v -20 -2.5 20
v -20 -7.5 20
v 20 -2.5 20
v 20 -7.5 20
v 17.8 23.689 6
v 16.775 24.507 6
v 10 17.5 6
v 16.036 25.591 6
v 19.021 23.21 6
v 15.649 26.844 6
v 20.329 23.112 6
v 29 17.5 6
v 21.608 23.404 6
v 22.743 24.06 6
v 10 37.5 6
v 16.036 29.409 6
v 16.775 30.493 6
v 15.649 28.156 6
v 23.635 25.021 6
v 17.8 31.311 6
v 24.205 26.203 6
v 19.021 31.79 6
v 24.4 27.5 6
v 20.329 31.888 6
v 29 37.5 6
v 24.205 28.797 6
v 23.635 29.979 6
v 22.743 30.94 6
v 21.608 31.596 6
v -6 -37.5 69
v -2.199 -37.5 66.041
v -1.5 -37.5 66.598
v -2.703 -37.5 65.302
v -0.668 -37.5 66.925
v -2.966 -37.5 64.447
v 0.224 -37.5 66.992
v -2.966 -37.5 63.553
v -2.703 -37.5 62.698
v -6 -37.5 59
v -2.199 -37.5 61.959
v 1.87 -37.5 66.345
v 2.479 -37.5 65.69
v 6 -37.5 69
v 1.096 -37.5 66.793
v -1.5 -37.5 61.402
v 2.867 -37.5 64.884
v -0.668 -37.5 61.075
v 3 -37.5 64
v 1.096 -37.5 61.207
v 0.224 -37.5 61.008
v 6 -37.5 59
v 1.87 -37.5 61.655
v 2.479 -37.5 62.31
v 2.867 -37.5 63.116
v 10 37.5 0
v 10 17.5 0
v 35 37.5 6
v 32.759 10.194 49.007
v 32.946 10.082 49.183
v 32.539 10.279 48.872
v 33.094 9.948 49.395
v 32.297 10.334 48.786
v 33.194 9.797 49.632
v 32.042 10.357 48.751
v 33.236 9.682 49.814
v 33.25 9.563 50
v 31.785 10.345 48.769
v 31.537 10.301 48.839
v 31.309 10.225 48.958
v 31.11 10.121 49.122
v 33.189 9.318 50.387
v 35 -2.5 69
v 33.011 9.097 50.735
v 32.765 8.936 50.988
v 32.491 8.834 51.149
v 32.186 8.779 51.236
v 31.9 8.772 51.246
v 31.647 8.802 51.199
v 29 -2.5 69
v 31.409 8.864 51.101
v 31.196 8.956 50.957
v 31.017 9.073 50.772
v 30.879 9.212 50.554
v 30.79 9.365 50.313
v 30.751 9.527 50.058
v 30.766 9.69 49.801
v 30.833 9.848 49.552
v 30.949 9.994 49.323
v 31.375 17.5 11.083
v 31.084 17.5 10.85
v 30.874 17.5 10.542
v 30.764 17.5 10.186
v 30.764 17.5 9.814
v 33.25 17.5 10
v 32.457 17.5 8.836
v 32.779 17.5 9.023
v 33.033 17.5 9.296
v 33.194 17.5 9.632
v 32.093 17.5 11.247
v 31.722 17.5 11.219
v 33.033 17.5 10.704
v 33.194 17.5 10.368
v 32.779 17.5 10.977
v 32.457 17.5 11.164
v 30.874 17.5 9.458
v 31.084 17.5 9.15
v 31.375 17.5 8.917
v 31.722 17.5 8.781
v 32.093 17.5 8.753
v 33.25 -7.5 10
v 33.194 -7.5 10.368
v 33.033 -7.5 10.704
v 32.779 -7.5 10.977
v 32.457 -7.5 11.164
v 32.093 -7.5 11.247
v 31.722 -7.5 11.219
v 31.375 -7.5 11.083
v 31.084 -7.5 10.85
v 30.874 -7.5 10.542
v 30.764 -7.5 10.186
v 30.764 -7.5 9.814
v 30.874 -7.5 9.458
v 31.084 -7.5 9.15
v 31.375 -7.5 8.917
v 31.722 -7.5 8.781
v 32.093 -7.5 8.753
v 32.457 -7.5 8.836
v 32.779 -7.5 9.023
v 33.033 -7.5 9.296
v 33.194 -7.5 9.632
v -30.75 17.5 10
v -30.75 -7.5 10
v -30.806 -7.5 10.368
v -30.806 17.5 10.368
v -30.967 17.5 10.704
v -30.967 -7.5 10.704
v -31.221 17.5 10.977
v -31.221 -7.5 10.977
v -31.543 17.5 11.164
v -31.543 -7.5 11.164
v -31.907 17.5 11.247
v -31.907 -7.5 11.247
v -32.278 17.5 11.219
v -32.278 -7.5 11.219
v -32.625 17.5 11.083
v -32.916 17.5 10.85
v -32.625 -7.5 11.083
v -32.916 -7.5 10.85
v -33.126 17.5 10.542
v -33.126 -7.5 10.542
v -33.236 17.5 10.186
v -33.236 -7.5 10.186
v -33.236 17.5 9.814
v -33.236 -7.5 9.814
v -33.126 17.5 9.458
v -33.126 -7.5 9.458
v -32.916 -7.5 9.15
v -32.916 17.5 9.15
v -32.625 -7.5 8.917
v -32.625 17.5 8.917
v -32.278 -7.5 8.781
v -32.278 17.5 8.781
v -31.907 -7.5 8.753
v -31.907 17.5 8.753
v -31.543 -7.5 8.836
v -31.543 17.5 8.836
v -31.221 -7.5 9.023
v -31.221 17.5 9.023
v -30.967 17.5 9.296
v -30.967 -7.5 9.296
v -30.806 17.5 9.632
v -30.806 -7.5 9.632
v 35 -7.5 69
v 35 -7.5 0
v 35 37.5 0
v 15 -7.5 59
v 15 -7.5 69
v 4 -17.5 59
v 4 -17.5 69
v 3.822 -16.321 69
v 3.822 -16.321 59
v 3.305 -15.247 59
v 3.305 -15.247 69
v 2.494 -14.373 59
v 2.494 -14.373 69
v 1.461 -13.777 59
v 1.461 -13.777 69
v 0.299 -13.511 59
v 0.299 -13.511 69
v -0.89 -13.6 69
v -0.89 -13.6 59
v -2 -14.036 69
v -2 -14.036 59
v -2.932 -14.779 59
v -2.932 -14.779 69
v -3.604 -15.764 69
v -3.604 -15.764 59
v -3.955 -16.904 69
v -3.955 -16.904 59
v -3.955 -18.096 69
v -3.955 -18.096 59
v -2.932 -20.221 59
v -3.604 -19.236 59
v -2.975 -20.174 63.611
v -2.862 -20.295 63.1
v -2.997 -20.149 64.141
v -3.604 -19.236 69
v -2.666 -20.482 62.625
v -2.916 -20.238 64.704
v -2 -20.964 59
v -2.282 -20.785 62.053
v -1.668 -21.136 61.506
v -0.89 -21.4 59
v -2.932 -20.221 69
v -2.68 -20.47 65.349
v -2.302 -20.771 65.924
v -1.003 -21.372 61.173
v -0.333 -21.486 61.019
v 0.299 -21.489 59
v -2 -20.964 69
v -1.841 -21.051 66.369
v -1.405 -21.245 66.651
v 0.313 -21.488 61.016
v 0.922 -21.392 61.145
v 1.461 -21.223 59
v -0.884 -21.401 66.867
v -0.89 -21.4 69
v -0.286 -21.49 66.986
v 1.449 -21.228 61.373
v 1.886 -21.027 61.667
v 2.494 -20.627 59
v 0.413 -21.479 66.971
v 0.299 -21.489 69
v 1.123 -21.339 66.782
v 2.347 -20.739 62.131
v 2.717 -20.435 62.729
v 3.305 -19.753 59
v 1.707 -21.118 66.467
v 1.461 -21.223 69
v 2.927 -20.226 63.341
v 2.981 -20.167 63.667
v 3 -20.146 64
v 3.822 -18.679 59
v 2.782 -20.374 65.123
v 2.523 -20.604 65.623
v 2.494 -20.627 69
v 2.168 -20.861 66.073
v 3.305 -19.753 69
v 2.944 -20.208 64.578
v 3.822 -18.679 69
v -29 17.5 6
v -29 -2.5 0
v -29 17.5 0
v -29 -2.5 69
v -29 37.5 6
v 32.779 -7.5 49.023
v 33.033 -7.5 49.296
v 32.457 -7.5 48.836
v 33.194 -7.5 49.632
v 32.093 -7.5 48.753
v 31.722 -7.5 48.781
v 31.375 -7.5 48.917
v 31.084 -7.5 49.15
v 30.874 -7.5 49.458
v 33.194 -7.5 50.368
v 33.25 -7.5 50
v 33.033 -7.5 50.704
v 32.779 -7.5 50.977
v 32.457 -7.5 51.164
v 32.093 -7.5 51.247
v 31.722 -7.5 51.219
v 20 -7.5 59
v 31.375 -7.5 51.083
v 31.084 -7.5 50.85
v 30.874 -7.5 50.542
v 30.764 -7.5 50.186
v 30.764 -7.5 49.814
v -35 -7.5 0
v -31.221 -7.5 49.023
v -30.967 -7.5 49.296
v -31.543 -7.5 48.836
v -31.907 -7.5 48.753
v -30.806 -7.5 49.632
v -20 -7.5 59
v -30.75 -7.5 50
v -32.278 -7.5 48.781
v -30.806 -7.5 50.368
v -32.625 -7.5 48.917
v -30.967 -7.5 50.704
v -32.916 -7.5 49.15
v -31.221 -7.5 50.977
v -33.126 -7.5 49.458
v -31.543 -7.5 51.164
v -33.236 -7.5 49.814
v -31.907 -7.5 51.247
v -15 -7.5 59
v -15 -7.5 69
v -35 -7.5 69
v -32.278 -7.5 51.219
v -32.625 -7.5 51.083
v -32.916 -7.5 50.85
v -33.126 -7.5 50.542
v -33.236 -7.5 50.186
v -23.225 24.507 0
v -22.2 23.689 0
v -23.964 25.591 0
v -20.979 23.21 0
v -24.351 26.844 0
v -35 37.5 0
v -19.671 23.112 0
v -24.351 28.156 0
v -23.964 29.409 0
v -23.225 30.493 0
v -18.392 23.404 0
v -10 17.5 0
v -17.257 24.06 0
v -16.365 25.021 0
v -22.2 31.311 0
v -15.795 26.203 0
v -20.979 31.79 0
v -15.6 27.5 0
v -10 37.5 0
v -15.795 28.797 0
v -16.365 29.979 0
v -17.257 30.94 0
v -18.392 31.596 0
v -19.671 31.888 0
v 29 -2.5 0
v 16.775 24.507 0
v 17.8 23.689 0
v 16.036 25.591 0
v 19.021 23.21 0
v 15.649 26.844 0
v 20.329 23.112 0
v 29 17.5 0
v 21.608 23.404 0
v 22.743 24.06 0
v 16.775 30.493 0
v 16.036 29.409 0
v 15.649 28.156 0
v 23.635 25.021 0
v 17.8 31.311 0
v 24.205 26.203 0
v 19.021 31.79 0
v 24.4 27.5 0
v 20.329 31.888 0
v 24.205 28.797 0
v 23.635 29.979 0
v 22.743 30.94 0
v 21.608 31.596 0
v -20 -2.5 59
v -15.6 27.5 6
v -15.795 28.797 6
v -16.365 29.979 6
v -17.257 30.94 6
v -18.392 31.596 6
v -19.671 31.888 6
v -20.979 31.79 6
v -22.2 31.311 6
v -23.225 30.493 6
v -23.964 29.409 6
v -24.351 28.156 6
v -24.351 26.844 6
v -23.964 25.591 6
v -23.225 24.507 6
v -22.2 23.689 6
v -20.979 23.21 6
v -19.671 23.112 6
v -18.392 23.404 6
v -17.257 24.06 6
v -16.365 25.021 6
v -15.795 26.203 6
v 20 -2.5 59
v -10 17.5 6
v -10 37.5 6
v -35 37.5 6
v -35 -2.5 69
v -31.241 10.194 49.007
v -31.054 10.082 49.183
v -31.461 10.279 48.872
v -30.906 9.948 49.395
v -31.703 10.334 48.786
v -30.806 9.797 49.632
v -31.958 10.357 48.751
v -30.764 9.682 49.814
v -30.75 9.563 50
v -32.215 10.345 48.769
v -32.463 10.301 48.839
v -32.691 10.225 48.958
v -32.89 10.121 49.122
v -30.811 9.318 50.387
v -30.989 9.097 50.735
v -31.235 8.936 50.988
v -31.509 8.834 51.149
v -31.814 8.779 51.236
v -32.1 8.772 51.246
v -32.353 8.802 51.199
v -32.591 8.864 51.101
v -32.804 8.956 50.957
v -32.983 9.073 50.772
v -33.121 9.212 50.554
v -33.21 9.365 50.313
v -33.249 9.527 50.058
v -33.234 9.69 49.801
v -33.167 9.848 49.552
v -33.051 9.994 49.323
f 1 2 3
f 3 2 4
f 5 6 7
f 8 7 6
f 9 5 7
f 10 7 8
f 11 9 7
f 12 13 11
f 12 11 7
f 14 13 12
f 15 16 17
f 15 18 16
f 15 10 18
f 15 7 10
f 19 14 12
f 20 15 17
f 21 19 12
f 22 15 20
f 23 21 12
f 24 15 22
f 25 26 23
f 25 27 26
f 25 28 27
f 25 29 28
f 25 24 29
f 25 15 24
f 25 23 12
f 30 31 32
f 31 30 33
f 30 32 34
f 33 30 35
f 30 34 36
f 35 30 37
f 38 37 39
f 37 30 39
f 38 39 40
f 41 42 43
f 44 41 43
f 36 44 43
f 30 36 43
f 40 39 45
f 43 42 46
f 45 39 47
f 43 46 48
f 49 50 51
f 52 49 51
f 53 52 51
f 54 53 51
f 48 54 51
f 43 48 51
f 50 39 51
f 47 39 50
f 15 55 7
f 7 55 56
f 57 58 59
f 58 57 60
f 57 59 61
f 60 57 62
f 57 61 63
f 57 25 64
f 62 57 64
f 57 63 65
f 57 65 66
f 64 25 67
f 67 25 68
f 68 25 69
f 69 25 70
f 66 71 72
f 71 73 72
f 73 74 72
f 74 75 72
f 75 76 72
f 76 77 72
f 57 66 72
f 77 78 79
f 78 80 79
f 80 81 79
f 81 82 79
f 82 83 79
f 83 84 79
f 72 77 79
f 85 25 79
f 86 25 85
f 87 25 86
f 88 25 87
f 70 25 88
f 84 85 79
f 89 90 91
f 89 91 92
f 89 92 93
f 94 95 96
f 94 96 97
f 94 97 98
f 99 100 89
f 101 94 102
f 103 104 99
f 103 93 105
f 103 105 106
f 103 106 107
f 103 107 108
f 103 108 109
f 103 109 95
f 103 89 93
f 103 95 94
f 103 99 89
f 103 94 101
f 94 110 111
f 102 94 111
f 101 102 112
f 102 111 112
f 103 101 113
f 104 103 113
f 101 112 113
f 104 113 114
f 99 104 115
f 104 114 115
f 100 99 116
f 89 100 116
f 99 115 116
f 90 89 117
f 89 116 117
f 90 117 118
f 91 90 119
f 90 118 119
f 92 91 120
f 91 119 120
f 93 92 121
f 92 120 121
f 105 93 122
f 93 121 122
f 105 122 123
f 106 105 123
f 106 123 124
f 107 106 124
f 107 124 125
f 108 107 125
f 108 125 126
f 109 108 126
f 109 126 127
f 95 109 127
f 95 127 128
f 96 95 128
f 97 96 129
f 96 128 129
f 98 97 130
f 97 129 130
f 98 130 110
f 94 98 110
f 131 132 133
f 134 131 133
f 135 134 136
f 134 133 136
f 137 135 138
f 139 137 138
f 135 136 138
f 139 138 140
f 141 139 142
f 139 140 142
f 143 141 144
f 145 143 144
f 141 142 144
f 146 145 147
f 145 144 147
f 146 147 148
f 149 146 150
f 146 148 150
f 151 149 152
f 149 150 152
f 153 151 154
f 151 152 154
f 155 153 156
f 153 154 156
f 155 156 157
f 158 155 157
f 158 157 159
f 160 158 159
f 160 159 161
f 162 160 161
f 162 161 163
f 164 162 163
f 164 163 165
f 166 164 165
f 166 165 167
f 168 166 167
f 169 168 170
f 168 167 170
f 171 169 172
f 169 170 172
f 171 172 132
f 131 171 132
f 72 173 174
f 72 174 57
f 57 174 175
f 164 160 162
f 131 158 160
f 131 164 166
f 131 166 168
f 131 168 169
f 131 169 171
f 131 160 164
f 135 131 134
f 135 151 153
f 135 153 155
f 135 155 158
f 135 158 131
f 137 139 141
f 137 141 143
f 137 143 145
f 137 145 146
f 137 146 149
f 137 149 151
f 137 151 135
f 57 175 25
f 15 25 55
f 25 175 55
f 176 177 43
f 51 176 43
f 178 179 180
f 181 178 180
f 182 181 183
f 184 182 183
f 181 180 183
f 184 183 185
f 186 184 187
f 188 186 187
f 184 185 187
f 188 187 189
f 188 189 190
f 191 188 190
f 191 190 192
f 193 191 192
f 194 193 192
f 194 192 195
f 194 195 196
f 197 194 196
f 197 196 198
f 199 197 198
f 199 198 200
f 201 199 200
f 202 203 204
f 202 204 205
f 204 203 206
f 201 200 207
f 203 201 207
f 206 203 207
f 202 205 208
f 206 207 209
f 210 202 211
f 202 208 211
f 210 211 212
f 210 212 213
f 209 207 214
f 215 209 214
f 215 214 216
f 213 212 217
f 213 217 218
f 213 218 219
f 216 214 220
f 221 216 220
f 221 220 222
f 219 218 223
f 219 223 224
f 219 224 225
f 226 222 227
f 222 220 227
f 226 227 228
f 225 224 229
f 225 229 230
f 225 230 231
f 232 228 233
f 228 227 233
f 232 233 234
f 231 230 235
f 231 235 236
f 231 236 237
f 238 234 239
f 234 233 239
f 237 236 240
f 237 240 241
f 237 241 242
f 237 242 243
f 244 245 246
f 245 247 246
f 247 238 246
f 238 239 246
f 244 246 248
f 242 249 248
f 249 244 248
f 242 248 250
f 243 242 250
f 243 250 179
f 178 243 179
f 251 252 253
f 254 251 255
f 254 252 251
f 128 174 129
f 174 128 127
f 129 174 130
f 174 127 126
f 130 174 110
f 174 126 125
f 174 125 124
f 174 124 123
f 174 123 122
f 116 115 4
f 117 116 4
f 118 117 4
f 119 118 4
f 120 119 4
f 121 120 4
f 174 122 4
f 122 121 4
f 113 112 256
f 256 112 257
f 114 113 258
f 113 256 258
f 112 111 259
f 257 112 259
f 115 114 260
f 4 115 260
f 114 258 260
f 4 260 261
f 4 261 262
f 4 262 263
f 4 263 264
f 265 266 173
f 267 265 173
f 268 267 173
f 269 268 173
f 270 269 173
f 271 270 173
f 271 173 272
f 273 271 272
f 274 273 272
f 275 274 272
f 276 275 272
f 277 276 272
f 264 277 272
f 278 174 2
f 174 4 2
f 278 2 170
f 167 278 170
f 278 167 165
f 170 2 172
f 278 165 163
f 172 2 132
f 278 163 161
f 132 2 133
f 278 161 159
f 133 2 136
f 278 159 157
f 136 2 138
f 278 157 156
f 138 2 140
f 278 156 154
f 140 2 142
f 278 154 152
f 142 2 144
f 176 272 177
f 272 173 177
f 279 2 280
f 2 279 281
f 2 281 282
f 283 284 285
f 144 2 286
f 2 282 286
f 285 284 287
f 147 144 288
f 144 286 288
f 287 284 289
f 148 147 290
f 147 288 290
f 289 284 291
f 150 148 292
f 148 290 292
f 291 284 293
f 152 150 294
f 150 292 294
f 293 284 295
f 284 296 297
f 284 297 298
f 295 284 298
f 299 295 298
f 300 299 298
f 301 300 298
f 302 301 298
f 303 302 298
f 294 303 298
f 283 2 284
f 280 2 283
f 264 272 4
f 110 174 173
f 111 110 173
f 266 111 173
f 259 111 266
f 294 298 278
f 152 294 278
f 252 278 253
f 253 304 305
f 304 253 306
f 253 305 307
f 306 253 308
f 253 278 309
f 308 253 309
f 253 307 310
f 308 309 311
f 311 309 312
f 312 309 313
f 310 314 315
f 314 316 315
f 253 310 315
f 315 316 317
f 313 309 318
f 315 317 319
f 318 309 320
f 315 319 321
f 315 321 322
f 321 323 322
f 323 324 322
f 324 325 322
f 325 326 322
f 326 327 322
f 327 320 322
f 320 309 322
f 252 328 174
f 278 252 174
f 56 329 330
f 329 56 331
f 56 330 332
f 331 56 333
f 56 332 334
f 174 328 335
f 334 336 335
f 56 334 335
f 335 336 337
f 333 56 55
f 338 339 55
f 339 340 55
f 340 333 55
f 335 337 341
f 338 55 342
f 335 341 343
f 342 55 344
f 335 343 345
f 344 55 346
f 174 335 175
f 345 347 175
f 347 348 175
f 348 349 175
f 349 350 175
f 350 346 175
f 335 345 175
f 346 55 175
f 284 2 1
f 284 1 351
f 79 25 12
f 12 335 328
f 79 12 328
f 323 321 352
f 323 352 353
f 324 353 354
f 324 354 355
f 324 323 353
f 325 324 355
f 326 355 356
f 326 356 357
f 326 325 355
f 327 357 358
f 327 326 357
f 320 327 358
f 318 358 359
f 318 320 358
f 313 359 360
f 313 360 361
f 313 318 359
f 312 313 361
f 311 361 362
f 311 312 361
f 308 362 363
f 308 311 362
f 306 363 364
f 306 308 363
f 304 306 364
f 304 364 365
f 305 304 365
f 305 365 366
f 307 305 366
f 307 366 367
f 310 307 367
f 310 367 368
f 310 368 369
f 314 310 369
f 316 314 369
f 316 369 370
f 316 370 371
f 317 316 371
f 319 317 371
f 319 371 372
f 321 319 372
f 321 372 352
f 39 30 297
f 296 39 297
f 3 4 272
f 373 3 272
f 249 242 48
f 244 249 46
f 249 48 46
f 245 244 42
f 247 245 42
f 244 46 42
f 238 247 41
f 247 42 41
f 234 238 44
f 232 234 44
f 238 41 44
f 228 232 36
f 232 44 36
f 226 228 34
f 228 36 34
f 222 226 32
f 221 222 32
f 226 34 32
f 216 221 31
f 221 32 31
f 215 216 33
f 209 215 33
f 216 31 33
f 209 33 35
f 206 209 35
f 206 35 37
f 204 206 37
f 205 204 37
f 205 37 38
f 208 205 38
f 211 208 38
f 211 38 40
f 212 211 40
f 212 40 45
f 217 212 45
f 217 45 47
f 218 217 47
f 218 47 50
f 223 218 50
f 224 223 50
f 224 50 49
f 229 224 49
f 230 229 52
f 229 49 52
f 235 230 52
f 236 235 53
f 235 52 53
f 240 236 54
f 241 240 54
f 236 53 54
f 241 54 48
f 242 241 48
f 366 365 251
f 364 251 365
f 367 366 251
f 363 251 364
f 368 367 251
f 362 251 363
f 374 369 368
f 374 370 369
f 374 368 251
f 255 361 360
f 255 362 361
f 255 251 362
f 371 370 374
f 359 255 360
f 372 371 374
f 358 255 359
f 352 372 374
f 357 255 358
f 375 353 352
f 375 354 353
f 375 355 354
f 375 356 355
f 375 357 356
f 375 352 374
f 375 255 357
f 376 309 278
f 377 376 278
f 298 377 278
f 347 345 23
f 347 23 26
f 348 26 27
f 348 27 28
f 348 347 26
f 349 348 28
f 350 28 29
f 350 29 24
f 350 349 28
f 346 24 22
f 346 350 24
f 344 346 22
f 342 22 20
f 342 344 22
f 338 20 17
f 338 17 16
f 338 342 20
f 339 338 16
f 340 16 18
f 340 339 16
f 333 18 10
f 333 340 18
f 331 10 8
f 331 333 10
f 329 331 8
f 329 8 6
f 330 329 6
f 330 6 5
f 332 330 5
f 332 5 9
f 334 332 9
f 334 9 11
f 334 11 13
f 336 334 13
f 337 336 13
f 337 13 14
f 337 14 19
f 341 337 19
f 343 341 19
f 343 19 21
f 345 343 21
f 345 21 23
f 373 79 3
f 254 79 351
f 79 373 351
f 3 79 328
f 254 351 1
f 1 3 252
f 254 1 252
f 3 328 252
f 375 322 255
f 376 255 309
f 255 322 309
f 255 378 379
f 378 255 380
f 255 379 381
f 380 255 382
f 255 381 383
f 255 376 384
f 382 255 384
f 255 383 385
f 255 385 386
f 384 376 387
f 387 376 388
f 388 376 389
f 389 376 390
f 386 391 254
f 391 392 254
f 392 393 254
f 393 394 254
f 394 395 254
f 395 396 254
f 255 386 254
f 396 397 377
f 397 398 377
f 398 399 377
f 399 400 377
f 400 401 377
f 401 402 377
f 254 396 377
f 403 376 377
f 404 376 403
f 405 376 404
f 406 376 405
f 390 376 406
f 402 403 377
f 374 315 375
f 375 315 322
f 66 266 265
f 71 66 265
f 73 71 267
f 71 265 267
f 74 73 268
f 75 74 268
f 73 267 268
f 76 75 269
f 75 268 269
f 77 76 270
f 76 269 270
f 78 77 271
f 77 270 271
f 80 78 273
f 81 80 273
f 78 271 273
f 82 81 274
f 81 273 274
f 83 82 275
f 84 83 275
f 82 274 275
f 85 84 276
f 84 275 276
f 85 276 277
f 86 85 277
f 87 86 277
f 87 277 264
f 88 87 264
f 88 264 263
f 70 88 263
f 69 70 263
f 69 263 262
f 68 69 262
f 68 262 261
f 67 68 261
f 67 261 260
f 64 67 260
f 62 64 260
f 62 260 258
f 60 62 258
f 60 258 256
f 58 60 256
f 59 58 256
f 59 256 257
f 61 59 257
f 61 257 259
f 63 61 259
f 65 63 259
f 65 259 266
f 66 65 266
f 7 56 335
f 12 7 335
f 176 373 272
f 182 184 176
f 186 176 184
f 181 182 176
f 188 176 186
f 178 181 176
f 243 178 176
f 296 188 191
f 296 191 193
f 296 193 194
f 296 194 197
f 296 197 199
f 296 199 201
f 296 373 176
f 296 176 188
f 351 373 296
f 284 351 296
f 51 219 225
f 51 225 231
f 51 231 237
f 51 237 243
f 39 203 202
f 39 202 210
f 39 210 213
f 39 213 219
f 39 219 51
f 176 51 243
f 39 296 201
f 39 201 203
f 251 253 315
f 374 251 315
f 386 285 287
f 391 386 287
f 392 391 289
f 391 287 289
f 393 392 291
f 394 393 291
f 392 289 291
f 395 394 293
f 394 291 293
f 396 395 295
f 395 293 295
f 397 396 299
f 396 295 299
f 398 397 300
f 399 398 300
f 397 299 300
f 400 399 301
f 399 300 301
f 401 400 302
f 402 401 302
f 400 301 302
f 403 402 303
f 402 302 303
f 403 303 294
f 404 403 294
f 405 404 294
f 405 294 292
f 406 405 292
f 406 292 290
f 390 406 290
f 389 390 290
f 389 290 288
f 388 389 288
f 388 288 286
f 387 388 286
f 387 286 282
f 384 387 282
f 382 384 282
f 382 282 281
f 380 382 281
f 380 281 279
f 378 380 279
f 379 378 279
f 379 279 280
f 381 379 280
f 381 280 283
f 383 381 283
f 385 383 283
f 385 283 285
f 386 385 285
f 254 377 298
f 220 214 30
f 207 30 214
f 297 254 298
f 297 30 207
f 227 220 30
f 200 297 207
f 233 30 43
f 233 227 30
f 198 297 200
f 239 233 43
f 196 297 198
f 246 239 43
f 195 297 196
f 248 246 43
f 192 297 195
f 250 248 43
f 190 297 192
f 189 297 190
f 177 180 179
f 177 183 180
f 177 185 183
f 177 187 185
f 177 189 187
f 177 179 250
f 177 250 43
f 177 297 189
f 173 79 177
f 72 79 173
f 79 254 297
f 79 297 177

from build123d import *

# Parameters (mm, degrees)
F0_R      = 4.4
F1_DEPTH  = 69
F2_W      = 30
F2_H      = 59
F3_DEPTH  = 70.001
F4_W      = 19
F4_H      = 20
F4_R      = 4.4
F5_DEPTH  = 63
F7_DEPTH  = 70.001
F8_W      = 40
F8_H      = 39
F9_DEPTH  = 45.001
F10_R     = 4
F11_DEPTH = 69.001
F12_R     = 3
F13_DEPTH = 17.3552487891
F15_DEPTH = 69.001
F16_R     = 1.25
F17_DEPTH = 25


with BuildPart() as f1:
    # F0 (on Top) → F1 (new body)
    with BuildSketch(Plane.XY):
        Polygon((-35, -37.5), (35, -37.5), (35, 37.5), (10, 37.5), (10, 17.5), (29, 17.5), (29, -2.5), (-29, -2.5), (-29, 17.5), (-10, 17.5), (-10, 37.5), (-35, 37.5), align=None)
        with Locations((-20, 27.5)):
            Circle(F0_R, mode=Mode.SUBTRACT)
        with Locations((20, 27.5)):
            Circle(F0_R, mode=Mode.SUBTRACT)
    extrude(amount=F1_DEPTH)

    # F2 (on face) → F3 (cut, through all)
    with BuildSketch(Plane(origin=(-35, 0, 0), x_dir=(0, -1, 0), z_dir=(-1, 0, 0))):
        with Locations((22.5, 29.5)):
            Rectangle(F2_W, F2_H)
    extrude(amount=-F3_DEPTH, mode=Mode.SUBTRACT)

    # F4 (on face) → F5 (cut)
    with BuildSketch(Plane.XY.offset(69)):
        with Locations((19.5, 27.5)):
            Rectangle(F4_W, F4_H)
        with Locations((20, 27.5)):
            Circle(F4_R, mode=Mode.SUBTRACT)
        with Locations((-19.5, 27.5)):
            Rectangle(F4_W, F4_H)
        with Locations((-20, 27.5)):
            Circle(F4_R, mode=Mode.SUBTRACT)
    extrude(amount=-F5_DEPTH, mode=Mode.SUBTRACT)

    # F6 (on face) → F7 (cut, through all)
    with BuildSketch(Plane(origin=(-35, 0, 0), x_dir=(0, -1, 0), z_dir=(-1, 0, 0))):
        Polygon((2.5, 69), (-37.5, 69), (-37.5, 6), align=None)
    extrude(amount=-F7_DEPTH, mode=Mode.SUBTRACT)

    # F8 (on face) → F9 (cut, through all)
    with BuildSketch(Plane.XZ.offset(7.5)):
        with Locations((0, 39.5)):
            Rectangle(F8_W, F8_H)
    extrude(amount=-F9_DEPTH, mode=Mode.SUBTRACT)

    # F10 (on face) → F11 (cut, through all)
    with BuildSketch(Plane.XY.offset(69)):
        with Locations((0, -17.5)):
            Circle(F10_R)
    extrude(amount=-F11_DEPTH, mode=Mode.SUBTRACT)

    # F12 (on face) → F13 (cut, through all)
    with BuildSketch(Plane.XZ.offset(37.5)):
        with Locations((0, 64)):
            Circle(F12_R)
    extrude(amount=-F13_DEPTH, mode=Mode.SUBTRACT)

    # F14 (on face) → F15 (cut, through all)
    with BuildSketch(Plane.XY.offset(69)):
        Polygon((-15, -7.5), (-35, -7.5), (-35, -37.5), (-6, -37.5), align=None)
        Polygon((15, -7.5), (6, -37.5), (35, -37.5), (35, -7.5), align=None)
    extrude(amount=-F15_DEPTH, mode=Mode.SUBTRACT)

    # F16 (on face) → F17 (cut)
    with BuildSketch(Plane.XZ.offset(7.5)):
        with Locations((-32, 50)):
            Circle(F16_R)
        with Locations((-32, 10)):
            Circle(F16_R)
        with Locations((32, 50)):
            Circle(F16_R)
        with Locations((32, 10)):
            Circle(F16_R)
    extrude(amount=-F17_DEPTH, mode=Mode.SUBTRACT)


solid = f1.part
